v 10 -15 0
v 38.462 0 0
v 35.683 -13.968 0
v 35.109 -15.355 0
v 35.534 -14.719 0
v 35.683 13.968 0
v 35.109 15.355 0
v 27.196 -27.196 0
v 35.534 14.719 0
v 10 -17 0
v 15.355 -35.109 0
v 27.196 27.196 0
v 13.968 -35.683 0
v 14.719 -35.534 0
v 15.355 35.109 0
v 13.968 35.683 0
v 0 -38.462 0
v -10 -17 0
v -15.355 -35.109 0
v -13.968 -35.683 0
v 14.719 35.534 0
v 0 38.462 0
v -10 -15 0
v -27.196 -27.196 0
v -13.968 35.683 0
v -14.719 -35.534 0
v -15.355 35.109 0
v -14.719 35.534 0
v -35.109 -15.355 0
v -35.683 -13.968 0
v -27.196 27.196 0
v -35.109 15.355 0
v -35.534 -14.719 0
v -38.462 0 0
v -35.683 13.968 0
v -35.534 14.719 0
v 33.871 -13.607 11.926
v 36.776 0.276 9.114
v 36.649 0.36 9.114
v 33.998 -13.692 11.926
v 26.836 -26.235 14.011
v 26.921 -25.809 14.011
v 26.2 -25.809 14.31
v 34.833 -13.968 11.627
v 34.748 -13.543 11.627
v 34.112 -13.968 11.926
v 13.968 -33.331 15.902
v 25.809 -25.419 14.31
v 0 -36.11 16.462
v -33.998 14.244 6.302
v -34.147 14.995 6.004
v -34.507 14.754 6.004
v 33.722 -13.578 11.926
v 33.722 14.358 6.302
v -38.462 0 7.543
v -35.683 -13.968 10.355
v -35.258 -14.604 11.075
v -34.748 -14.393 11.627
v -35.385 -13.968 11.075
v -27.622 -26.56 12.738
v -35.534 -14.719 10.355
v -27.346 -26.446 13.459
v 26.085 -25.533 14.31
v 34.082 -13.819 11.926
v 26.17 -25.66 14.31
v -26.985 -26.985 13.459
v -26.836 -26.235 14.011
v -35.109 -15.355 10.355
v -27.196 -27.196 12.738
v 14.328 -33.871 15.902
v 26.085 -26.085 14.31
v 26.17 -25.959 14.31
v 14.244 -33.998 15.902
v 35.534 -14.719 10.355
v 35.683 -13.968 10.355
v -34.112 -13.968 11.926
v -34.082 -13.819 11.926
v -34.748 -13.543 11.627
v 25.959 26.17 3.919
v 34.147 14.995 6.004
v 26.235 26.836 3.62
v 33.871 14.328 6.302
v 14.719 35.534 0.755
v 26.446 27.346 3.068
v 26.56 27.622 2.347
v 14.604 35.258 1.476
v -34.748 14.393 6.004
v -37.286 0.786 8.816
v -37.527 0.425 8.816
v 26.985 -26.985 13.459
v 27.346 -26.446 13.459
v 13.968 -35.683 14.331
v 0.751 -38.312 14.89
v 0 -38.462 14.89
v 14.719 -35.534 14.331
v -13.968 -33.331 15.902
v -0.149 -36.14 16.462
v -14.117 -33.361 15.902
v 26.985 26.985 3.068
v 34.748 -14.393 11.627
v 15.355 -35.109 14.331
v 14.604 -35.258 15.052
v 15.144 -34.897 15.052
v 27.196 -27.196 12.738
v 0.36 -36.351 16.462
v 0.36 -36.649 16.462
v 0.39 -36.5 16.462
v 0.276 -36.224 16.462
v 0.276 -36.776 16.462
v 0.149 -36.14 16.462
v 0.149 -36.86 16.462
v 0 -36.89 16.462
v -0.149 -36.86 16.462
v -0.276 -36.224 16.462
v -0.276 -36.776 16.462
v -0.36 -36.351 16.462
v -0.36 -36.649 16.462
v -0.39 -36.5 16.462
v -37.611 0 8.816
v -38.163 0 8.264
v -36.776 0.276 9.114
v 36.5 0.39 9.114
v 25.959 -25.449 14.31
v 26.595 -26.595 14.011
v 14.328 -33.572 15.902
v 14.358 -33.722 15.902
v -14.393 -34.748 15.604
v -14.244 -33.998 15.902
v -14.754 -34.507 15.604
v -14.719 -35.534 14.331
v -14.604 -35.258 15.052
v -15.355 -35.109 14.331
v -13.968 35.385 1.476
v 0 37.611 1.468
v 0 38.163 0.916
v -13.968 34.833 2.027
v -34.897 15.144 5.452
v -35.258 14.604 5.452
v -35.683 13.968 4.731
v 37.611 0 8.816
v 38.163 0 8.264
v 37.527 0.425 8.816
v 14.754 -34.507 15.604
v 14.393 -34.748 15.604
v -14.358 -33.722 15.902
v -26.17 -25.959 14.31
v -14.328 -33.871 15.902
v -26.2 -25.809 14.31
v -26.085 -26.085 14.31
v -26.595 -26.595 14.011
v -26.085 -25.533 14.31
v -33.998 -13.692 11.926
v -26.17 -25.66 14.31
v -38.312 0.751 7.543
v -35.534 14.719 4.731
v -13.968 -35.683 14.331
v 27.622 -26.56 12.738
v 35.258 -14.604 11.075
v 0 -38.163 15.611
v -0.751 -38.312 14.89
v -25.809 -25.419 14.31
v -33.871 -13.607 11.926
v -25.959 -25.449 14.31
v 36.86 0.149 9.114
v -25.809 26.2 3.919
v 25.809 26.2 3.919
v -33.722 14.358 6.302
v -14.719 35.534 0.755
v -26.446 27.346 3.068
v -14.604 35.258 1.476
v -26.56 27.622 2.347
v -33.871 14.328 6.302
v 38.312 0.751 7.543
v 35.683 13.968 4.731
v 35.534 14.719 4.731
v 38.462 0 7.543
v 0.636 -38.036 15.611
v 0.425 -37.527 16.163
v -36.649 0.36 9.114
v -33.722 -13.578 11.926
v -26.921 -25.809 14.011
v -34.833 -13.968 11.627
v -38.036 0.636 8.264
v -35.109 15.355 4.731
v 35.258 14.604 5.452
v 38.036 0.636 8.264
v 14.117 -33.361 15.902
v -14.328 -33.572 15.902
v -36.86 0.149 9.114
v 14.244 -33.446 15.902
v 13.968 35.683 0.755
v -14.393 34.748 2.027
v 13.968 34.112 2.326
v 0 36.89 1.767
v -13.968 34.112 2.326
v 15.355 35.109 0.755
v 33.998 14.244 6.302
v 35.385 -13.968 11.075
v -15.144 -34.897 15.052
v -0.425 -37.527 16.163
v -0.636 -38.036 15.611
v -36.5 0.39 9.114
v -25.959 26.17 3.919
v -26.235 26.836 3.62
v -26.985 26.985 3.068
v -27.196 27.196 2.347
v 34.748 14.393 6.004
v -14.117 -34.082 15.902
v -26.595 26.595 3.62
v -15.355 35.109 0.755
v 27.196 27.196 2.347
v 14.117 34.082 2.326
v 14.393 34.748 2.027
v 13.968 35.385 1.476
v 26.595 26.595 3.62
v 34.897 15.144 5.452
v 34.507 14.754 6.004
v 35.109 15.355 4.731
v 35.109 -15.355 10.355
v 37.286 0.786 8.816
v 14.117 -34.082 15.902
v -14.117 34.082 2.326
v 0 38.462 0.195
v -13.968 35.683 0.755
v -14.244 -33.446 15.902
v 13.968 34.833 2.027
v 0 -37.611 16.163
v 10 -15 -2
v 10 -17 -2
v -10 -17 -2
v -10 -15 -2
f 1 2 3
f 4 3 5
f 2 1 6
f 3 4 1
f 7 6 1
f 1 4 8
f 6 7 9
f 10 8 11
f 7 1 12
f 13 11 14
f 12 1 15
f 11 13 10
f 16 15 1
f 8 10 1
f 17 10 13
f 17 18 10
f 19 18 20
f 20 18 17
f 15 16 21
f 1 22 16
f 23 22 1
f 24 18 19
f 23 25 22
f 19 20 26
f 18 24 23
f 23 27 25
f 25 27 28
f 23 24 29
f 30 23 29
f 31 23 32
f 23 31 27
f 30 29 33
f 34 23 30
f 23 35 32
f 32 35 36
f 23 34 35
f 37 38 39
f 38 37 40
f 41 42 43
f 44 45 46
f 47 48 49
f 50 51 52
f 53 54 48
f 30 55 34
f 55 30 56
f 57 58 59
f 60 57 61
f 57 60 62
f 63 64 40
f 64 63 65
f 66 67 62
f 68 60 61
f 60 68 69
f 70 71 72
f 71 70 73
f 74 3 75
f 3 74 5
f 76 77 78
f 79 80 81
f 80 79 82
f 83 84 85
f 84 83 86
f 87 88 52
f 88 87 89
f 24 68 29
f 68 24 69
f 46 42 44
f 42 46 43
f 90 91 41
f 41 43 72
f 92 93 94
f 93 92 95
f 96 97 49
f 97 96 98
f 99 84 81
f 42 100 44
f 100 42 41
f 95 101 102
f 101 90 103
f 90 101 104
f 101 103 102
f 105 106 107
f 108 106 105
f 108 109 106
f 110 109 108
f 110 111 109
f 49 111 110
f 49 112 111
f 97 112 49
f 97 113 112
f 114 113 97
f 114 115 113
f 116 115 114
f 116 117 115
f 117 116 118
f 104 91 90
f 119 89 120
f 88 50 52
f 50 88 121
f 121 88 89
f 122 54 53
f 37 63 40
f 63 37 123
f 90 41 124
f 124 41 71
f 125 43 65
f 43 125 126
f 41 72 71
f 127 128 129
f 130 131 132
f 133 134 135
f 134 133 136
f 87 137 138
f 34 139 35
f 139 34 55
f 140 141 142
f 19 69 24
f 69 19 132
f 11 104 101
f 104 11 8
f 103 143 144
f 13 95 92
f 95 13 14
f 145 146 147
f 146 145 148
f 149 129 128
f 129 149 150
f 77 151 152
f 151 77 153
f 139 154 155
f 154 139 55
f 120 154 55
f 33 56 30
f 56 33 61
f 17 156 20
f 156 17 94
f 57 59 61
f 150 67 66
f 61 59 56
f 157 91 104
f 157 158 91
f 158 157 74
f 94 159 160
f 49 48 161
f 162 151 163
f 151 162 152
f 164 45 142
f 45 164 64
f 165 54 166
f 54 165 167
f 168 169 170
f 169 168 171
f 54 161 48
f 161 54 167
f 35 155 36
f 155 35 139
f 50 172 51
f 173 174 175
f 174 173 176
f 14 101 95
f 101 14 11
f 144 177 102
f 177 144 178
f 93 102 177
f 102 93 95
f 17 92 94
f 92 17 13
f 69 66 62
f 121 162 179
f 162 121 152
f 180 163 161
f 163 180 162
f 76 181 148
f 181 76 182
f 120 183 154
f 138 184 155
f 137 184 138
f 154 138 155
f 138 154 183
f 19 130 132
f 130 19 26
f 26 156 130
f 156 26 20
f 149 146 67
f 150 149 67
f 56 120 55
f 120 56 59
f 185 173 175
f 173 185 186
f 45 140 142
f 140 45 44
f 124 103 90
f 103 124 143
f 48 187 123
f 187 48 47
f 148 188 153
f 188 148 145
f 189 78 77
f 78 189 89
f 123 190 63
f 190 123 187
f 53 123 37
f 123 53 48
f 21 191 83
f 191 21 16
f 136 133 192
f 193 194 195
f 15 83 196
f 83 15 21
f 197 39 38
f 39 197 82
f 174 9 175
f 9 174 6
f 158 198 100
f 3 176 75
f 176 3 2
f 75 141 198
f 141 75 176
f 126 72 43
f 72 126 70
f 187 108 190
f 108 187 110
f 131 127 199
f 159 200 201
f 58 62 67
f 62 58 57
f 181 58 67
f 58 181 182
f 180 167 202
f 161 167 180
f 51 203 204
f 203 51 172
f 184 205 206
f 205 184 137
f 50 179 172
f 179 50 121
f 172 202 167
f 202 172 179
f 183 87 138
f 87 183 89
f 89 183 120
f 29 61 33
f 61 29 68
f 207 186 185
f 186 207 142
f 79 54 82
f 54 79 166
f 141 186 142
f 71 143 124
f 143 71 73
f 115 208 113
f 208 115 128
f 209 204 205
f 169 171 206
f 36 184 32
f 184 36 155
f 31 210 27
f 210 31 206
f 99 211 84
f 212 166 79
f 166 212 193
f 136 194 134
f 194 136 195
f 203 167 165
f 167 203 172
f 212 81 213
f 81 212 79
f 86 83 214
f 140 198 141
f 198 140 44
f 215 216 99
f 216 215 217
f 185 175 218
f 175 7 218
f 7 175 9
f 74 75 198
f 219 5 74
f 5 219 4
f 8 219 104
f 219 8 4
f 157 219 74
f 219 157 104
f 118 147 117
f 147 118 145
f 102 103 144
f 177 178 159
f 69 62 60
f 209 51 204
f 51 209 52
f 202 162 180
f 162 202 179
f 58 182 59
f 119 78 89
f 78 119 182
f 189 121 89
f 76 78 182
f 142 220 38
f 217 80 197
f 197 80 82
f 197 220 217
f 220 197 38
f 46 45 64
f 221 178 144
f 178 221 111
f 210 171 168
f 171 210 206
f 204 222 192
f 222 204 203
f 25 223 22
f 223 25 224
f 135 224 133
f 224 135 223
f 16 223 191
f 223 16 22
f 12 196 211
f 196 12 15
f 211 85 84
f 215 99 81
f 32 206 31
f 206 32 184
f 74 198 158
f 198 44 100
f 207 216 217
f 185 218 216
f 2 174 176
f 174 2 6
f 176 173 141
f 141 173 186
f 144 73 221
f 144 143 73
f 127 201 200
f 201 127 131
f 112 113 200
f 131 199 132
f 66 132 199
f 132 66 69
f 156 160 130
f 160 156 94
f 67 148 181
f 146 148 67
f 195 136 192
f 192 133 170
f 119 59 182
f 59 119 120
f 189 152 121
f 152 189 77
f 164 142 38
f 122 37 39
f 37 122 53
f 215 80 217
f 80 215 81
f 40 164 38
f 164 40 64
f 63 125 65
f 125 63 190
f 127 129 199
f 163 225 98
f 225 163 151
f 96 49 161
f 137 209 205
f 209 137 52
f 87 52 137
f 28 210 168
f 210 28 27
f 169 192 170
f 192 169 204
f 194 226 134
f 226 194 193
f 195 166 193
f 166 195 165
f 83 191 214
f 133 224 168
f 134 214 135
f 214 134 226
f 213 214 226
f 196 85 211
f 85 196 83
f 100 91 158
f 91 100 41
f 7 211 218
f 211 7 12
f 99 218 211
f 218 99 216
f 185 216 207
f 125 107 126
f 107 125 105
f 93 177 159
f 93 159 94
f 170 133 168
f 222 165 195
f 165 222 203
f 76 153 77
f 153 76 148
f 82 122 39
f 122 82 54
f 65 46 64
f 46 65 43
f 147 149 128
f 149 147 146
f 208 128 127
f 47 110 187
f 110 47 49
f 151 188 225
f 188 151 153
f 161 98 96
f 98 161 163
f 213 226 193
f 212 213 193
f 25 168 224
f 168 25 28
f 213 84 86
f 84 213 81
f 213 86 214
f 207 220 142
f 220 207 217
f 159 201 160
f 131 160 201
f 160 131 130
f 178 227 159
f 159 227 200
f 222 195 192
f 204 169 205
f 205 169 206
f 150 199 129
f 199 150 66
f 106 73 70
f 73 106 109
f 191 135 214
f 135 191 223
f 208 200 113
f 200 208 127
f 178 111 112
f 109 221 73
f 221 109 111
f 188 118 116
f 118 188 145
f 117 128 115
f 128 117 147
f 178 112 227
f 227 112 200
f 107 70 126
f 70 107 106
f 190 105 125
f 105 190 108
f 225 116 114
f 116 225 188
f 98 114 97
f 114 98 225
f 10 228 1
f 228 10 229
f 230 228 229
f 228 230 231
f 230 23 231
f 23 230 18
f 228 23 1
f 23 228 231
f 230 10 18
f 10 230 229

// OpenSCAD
//Untersetzer fuer die Lampe auf dem Klavier (Keil, vorne hoch, hinten 0)

//Durchmesser (passt in ein Quadrat mit dieser Kantenlaenge)
d=77;
//Hoehe vorne
hv=30-13.5;
//Hoehe hinten
hh=1;
//Radius Abrundung obere Kreiskante
r=2;

/* [Stopper fuer die Kerbe im Klavier] */

//Abstand Stopper von der Vorderkante
as=45.5-(7.5+(110-77)/2);
//Laenge Stopper (nach hinten)
ls=2;
//Tiefe Stopper (nach unten)
ts=2;
//Breite Stopper (mittig links/rechts)
bst=20;

$fn=16;

//Stopper unter dem Boden, greift in die Kerbe
translate([-bst/2,-d/2+as,-ts])
    cube([bst,ls,ts]);

//Steigung von hinten (y=+d/2) nach vorne (y=-d/2)
winkel=atan((hv-hh)/d);
//Ebene um so viel anheben, dass die Rundung vorne wieder genau hv hoch ist
k=r*tan(winkel)+r/cos(winkel)-r;

//Keil mit Durchmesser dk, schraege Ebene um o nach unten versetzt
module keil(dk,o) {
    intersection() {
        translate([0,0,-o])
            cylinder(d=dk,h=hv+2*o);
        //Schraege Ebene: alles unterhalb gehoert zum Untersetzer
        translate([0,-d/2,hh+k])
            rotate([winkel,0,0])
                translate([-d,-d,-2*hv-o])
                    cube([2*d,3*d,2*hv]);
    }
}

//Innen um r verkleinert, per minkowski wieder auf d aufgefuellt.
//Unten flach abgeschnitten, damit nur die obere Kante rund ist und z=0 bleibt.
mirror([0,1,0])
intersection() {
    cylinder(d=2*d,h=2*hv);
    minkowski() {
        keil(d-2*r,r);
        sphere(r=r);
    }
}
